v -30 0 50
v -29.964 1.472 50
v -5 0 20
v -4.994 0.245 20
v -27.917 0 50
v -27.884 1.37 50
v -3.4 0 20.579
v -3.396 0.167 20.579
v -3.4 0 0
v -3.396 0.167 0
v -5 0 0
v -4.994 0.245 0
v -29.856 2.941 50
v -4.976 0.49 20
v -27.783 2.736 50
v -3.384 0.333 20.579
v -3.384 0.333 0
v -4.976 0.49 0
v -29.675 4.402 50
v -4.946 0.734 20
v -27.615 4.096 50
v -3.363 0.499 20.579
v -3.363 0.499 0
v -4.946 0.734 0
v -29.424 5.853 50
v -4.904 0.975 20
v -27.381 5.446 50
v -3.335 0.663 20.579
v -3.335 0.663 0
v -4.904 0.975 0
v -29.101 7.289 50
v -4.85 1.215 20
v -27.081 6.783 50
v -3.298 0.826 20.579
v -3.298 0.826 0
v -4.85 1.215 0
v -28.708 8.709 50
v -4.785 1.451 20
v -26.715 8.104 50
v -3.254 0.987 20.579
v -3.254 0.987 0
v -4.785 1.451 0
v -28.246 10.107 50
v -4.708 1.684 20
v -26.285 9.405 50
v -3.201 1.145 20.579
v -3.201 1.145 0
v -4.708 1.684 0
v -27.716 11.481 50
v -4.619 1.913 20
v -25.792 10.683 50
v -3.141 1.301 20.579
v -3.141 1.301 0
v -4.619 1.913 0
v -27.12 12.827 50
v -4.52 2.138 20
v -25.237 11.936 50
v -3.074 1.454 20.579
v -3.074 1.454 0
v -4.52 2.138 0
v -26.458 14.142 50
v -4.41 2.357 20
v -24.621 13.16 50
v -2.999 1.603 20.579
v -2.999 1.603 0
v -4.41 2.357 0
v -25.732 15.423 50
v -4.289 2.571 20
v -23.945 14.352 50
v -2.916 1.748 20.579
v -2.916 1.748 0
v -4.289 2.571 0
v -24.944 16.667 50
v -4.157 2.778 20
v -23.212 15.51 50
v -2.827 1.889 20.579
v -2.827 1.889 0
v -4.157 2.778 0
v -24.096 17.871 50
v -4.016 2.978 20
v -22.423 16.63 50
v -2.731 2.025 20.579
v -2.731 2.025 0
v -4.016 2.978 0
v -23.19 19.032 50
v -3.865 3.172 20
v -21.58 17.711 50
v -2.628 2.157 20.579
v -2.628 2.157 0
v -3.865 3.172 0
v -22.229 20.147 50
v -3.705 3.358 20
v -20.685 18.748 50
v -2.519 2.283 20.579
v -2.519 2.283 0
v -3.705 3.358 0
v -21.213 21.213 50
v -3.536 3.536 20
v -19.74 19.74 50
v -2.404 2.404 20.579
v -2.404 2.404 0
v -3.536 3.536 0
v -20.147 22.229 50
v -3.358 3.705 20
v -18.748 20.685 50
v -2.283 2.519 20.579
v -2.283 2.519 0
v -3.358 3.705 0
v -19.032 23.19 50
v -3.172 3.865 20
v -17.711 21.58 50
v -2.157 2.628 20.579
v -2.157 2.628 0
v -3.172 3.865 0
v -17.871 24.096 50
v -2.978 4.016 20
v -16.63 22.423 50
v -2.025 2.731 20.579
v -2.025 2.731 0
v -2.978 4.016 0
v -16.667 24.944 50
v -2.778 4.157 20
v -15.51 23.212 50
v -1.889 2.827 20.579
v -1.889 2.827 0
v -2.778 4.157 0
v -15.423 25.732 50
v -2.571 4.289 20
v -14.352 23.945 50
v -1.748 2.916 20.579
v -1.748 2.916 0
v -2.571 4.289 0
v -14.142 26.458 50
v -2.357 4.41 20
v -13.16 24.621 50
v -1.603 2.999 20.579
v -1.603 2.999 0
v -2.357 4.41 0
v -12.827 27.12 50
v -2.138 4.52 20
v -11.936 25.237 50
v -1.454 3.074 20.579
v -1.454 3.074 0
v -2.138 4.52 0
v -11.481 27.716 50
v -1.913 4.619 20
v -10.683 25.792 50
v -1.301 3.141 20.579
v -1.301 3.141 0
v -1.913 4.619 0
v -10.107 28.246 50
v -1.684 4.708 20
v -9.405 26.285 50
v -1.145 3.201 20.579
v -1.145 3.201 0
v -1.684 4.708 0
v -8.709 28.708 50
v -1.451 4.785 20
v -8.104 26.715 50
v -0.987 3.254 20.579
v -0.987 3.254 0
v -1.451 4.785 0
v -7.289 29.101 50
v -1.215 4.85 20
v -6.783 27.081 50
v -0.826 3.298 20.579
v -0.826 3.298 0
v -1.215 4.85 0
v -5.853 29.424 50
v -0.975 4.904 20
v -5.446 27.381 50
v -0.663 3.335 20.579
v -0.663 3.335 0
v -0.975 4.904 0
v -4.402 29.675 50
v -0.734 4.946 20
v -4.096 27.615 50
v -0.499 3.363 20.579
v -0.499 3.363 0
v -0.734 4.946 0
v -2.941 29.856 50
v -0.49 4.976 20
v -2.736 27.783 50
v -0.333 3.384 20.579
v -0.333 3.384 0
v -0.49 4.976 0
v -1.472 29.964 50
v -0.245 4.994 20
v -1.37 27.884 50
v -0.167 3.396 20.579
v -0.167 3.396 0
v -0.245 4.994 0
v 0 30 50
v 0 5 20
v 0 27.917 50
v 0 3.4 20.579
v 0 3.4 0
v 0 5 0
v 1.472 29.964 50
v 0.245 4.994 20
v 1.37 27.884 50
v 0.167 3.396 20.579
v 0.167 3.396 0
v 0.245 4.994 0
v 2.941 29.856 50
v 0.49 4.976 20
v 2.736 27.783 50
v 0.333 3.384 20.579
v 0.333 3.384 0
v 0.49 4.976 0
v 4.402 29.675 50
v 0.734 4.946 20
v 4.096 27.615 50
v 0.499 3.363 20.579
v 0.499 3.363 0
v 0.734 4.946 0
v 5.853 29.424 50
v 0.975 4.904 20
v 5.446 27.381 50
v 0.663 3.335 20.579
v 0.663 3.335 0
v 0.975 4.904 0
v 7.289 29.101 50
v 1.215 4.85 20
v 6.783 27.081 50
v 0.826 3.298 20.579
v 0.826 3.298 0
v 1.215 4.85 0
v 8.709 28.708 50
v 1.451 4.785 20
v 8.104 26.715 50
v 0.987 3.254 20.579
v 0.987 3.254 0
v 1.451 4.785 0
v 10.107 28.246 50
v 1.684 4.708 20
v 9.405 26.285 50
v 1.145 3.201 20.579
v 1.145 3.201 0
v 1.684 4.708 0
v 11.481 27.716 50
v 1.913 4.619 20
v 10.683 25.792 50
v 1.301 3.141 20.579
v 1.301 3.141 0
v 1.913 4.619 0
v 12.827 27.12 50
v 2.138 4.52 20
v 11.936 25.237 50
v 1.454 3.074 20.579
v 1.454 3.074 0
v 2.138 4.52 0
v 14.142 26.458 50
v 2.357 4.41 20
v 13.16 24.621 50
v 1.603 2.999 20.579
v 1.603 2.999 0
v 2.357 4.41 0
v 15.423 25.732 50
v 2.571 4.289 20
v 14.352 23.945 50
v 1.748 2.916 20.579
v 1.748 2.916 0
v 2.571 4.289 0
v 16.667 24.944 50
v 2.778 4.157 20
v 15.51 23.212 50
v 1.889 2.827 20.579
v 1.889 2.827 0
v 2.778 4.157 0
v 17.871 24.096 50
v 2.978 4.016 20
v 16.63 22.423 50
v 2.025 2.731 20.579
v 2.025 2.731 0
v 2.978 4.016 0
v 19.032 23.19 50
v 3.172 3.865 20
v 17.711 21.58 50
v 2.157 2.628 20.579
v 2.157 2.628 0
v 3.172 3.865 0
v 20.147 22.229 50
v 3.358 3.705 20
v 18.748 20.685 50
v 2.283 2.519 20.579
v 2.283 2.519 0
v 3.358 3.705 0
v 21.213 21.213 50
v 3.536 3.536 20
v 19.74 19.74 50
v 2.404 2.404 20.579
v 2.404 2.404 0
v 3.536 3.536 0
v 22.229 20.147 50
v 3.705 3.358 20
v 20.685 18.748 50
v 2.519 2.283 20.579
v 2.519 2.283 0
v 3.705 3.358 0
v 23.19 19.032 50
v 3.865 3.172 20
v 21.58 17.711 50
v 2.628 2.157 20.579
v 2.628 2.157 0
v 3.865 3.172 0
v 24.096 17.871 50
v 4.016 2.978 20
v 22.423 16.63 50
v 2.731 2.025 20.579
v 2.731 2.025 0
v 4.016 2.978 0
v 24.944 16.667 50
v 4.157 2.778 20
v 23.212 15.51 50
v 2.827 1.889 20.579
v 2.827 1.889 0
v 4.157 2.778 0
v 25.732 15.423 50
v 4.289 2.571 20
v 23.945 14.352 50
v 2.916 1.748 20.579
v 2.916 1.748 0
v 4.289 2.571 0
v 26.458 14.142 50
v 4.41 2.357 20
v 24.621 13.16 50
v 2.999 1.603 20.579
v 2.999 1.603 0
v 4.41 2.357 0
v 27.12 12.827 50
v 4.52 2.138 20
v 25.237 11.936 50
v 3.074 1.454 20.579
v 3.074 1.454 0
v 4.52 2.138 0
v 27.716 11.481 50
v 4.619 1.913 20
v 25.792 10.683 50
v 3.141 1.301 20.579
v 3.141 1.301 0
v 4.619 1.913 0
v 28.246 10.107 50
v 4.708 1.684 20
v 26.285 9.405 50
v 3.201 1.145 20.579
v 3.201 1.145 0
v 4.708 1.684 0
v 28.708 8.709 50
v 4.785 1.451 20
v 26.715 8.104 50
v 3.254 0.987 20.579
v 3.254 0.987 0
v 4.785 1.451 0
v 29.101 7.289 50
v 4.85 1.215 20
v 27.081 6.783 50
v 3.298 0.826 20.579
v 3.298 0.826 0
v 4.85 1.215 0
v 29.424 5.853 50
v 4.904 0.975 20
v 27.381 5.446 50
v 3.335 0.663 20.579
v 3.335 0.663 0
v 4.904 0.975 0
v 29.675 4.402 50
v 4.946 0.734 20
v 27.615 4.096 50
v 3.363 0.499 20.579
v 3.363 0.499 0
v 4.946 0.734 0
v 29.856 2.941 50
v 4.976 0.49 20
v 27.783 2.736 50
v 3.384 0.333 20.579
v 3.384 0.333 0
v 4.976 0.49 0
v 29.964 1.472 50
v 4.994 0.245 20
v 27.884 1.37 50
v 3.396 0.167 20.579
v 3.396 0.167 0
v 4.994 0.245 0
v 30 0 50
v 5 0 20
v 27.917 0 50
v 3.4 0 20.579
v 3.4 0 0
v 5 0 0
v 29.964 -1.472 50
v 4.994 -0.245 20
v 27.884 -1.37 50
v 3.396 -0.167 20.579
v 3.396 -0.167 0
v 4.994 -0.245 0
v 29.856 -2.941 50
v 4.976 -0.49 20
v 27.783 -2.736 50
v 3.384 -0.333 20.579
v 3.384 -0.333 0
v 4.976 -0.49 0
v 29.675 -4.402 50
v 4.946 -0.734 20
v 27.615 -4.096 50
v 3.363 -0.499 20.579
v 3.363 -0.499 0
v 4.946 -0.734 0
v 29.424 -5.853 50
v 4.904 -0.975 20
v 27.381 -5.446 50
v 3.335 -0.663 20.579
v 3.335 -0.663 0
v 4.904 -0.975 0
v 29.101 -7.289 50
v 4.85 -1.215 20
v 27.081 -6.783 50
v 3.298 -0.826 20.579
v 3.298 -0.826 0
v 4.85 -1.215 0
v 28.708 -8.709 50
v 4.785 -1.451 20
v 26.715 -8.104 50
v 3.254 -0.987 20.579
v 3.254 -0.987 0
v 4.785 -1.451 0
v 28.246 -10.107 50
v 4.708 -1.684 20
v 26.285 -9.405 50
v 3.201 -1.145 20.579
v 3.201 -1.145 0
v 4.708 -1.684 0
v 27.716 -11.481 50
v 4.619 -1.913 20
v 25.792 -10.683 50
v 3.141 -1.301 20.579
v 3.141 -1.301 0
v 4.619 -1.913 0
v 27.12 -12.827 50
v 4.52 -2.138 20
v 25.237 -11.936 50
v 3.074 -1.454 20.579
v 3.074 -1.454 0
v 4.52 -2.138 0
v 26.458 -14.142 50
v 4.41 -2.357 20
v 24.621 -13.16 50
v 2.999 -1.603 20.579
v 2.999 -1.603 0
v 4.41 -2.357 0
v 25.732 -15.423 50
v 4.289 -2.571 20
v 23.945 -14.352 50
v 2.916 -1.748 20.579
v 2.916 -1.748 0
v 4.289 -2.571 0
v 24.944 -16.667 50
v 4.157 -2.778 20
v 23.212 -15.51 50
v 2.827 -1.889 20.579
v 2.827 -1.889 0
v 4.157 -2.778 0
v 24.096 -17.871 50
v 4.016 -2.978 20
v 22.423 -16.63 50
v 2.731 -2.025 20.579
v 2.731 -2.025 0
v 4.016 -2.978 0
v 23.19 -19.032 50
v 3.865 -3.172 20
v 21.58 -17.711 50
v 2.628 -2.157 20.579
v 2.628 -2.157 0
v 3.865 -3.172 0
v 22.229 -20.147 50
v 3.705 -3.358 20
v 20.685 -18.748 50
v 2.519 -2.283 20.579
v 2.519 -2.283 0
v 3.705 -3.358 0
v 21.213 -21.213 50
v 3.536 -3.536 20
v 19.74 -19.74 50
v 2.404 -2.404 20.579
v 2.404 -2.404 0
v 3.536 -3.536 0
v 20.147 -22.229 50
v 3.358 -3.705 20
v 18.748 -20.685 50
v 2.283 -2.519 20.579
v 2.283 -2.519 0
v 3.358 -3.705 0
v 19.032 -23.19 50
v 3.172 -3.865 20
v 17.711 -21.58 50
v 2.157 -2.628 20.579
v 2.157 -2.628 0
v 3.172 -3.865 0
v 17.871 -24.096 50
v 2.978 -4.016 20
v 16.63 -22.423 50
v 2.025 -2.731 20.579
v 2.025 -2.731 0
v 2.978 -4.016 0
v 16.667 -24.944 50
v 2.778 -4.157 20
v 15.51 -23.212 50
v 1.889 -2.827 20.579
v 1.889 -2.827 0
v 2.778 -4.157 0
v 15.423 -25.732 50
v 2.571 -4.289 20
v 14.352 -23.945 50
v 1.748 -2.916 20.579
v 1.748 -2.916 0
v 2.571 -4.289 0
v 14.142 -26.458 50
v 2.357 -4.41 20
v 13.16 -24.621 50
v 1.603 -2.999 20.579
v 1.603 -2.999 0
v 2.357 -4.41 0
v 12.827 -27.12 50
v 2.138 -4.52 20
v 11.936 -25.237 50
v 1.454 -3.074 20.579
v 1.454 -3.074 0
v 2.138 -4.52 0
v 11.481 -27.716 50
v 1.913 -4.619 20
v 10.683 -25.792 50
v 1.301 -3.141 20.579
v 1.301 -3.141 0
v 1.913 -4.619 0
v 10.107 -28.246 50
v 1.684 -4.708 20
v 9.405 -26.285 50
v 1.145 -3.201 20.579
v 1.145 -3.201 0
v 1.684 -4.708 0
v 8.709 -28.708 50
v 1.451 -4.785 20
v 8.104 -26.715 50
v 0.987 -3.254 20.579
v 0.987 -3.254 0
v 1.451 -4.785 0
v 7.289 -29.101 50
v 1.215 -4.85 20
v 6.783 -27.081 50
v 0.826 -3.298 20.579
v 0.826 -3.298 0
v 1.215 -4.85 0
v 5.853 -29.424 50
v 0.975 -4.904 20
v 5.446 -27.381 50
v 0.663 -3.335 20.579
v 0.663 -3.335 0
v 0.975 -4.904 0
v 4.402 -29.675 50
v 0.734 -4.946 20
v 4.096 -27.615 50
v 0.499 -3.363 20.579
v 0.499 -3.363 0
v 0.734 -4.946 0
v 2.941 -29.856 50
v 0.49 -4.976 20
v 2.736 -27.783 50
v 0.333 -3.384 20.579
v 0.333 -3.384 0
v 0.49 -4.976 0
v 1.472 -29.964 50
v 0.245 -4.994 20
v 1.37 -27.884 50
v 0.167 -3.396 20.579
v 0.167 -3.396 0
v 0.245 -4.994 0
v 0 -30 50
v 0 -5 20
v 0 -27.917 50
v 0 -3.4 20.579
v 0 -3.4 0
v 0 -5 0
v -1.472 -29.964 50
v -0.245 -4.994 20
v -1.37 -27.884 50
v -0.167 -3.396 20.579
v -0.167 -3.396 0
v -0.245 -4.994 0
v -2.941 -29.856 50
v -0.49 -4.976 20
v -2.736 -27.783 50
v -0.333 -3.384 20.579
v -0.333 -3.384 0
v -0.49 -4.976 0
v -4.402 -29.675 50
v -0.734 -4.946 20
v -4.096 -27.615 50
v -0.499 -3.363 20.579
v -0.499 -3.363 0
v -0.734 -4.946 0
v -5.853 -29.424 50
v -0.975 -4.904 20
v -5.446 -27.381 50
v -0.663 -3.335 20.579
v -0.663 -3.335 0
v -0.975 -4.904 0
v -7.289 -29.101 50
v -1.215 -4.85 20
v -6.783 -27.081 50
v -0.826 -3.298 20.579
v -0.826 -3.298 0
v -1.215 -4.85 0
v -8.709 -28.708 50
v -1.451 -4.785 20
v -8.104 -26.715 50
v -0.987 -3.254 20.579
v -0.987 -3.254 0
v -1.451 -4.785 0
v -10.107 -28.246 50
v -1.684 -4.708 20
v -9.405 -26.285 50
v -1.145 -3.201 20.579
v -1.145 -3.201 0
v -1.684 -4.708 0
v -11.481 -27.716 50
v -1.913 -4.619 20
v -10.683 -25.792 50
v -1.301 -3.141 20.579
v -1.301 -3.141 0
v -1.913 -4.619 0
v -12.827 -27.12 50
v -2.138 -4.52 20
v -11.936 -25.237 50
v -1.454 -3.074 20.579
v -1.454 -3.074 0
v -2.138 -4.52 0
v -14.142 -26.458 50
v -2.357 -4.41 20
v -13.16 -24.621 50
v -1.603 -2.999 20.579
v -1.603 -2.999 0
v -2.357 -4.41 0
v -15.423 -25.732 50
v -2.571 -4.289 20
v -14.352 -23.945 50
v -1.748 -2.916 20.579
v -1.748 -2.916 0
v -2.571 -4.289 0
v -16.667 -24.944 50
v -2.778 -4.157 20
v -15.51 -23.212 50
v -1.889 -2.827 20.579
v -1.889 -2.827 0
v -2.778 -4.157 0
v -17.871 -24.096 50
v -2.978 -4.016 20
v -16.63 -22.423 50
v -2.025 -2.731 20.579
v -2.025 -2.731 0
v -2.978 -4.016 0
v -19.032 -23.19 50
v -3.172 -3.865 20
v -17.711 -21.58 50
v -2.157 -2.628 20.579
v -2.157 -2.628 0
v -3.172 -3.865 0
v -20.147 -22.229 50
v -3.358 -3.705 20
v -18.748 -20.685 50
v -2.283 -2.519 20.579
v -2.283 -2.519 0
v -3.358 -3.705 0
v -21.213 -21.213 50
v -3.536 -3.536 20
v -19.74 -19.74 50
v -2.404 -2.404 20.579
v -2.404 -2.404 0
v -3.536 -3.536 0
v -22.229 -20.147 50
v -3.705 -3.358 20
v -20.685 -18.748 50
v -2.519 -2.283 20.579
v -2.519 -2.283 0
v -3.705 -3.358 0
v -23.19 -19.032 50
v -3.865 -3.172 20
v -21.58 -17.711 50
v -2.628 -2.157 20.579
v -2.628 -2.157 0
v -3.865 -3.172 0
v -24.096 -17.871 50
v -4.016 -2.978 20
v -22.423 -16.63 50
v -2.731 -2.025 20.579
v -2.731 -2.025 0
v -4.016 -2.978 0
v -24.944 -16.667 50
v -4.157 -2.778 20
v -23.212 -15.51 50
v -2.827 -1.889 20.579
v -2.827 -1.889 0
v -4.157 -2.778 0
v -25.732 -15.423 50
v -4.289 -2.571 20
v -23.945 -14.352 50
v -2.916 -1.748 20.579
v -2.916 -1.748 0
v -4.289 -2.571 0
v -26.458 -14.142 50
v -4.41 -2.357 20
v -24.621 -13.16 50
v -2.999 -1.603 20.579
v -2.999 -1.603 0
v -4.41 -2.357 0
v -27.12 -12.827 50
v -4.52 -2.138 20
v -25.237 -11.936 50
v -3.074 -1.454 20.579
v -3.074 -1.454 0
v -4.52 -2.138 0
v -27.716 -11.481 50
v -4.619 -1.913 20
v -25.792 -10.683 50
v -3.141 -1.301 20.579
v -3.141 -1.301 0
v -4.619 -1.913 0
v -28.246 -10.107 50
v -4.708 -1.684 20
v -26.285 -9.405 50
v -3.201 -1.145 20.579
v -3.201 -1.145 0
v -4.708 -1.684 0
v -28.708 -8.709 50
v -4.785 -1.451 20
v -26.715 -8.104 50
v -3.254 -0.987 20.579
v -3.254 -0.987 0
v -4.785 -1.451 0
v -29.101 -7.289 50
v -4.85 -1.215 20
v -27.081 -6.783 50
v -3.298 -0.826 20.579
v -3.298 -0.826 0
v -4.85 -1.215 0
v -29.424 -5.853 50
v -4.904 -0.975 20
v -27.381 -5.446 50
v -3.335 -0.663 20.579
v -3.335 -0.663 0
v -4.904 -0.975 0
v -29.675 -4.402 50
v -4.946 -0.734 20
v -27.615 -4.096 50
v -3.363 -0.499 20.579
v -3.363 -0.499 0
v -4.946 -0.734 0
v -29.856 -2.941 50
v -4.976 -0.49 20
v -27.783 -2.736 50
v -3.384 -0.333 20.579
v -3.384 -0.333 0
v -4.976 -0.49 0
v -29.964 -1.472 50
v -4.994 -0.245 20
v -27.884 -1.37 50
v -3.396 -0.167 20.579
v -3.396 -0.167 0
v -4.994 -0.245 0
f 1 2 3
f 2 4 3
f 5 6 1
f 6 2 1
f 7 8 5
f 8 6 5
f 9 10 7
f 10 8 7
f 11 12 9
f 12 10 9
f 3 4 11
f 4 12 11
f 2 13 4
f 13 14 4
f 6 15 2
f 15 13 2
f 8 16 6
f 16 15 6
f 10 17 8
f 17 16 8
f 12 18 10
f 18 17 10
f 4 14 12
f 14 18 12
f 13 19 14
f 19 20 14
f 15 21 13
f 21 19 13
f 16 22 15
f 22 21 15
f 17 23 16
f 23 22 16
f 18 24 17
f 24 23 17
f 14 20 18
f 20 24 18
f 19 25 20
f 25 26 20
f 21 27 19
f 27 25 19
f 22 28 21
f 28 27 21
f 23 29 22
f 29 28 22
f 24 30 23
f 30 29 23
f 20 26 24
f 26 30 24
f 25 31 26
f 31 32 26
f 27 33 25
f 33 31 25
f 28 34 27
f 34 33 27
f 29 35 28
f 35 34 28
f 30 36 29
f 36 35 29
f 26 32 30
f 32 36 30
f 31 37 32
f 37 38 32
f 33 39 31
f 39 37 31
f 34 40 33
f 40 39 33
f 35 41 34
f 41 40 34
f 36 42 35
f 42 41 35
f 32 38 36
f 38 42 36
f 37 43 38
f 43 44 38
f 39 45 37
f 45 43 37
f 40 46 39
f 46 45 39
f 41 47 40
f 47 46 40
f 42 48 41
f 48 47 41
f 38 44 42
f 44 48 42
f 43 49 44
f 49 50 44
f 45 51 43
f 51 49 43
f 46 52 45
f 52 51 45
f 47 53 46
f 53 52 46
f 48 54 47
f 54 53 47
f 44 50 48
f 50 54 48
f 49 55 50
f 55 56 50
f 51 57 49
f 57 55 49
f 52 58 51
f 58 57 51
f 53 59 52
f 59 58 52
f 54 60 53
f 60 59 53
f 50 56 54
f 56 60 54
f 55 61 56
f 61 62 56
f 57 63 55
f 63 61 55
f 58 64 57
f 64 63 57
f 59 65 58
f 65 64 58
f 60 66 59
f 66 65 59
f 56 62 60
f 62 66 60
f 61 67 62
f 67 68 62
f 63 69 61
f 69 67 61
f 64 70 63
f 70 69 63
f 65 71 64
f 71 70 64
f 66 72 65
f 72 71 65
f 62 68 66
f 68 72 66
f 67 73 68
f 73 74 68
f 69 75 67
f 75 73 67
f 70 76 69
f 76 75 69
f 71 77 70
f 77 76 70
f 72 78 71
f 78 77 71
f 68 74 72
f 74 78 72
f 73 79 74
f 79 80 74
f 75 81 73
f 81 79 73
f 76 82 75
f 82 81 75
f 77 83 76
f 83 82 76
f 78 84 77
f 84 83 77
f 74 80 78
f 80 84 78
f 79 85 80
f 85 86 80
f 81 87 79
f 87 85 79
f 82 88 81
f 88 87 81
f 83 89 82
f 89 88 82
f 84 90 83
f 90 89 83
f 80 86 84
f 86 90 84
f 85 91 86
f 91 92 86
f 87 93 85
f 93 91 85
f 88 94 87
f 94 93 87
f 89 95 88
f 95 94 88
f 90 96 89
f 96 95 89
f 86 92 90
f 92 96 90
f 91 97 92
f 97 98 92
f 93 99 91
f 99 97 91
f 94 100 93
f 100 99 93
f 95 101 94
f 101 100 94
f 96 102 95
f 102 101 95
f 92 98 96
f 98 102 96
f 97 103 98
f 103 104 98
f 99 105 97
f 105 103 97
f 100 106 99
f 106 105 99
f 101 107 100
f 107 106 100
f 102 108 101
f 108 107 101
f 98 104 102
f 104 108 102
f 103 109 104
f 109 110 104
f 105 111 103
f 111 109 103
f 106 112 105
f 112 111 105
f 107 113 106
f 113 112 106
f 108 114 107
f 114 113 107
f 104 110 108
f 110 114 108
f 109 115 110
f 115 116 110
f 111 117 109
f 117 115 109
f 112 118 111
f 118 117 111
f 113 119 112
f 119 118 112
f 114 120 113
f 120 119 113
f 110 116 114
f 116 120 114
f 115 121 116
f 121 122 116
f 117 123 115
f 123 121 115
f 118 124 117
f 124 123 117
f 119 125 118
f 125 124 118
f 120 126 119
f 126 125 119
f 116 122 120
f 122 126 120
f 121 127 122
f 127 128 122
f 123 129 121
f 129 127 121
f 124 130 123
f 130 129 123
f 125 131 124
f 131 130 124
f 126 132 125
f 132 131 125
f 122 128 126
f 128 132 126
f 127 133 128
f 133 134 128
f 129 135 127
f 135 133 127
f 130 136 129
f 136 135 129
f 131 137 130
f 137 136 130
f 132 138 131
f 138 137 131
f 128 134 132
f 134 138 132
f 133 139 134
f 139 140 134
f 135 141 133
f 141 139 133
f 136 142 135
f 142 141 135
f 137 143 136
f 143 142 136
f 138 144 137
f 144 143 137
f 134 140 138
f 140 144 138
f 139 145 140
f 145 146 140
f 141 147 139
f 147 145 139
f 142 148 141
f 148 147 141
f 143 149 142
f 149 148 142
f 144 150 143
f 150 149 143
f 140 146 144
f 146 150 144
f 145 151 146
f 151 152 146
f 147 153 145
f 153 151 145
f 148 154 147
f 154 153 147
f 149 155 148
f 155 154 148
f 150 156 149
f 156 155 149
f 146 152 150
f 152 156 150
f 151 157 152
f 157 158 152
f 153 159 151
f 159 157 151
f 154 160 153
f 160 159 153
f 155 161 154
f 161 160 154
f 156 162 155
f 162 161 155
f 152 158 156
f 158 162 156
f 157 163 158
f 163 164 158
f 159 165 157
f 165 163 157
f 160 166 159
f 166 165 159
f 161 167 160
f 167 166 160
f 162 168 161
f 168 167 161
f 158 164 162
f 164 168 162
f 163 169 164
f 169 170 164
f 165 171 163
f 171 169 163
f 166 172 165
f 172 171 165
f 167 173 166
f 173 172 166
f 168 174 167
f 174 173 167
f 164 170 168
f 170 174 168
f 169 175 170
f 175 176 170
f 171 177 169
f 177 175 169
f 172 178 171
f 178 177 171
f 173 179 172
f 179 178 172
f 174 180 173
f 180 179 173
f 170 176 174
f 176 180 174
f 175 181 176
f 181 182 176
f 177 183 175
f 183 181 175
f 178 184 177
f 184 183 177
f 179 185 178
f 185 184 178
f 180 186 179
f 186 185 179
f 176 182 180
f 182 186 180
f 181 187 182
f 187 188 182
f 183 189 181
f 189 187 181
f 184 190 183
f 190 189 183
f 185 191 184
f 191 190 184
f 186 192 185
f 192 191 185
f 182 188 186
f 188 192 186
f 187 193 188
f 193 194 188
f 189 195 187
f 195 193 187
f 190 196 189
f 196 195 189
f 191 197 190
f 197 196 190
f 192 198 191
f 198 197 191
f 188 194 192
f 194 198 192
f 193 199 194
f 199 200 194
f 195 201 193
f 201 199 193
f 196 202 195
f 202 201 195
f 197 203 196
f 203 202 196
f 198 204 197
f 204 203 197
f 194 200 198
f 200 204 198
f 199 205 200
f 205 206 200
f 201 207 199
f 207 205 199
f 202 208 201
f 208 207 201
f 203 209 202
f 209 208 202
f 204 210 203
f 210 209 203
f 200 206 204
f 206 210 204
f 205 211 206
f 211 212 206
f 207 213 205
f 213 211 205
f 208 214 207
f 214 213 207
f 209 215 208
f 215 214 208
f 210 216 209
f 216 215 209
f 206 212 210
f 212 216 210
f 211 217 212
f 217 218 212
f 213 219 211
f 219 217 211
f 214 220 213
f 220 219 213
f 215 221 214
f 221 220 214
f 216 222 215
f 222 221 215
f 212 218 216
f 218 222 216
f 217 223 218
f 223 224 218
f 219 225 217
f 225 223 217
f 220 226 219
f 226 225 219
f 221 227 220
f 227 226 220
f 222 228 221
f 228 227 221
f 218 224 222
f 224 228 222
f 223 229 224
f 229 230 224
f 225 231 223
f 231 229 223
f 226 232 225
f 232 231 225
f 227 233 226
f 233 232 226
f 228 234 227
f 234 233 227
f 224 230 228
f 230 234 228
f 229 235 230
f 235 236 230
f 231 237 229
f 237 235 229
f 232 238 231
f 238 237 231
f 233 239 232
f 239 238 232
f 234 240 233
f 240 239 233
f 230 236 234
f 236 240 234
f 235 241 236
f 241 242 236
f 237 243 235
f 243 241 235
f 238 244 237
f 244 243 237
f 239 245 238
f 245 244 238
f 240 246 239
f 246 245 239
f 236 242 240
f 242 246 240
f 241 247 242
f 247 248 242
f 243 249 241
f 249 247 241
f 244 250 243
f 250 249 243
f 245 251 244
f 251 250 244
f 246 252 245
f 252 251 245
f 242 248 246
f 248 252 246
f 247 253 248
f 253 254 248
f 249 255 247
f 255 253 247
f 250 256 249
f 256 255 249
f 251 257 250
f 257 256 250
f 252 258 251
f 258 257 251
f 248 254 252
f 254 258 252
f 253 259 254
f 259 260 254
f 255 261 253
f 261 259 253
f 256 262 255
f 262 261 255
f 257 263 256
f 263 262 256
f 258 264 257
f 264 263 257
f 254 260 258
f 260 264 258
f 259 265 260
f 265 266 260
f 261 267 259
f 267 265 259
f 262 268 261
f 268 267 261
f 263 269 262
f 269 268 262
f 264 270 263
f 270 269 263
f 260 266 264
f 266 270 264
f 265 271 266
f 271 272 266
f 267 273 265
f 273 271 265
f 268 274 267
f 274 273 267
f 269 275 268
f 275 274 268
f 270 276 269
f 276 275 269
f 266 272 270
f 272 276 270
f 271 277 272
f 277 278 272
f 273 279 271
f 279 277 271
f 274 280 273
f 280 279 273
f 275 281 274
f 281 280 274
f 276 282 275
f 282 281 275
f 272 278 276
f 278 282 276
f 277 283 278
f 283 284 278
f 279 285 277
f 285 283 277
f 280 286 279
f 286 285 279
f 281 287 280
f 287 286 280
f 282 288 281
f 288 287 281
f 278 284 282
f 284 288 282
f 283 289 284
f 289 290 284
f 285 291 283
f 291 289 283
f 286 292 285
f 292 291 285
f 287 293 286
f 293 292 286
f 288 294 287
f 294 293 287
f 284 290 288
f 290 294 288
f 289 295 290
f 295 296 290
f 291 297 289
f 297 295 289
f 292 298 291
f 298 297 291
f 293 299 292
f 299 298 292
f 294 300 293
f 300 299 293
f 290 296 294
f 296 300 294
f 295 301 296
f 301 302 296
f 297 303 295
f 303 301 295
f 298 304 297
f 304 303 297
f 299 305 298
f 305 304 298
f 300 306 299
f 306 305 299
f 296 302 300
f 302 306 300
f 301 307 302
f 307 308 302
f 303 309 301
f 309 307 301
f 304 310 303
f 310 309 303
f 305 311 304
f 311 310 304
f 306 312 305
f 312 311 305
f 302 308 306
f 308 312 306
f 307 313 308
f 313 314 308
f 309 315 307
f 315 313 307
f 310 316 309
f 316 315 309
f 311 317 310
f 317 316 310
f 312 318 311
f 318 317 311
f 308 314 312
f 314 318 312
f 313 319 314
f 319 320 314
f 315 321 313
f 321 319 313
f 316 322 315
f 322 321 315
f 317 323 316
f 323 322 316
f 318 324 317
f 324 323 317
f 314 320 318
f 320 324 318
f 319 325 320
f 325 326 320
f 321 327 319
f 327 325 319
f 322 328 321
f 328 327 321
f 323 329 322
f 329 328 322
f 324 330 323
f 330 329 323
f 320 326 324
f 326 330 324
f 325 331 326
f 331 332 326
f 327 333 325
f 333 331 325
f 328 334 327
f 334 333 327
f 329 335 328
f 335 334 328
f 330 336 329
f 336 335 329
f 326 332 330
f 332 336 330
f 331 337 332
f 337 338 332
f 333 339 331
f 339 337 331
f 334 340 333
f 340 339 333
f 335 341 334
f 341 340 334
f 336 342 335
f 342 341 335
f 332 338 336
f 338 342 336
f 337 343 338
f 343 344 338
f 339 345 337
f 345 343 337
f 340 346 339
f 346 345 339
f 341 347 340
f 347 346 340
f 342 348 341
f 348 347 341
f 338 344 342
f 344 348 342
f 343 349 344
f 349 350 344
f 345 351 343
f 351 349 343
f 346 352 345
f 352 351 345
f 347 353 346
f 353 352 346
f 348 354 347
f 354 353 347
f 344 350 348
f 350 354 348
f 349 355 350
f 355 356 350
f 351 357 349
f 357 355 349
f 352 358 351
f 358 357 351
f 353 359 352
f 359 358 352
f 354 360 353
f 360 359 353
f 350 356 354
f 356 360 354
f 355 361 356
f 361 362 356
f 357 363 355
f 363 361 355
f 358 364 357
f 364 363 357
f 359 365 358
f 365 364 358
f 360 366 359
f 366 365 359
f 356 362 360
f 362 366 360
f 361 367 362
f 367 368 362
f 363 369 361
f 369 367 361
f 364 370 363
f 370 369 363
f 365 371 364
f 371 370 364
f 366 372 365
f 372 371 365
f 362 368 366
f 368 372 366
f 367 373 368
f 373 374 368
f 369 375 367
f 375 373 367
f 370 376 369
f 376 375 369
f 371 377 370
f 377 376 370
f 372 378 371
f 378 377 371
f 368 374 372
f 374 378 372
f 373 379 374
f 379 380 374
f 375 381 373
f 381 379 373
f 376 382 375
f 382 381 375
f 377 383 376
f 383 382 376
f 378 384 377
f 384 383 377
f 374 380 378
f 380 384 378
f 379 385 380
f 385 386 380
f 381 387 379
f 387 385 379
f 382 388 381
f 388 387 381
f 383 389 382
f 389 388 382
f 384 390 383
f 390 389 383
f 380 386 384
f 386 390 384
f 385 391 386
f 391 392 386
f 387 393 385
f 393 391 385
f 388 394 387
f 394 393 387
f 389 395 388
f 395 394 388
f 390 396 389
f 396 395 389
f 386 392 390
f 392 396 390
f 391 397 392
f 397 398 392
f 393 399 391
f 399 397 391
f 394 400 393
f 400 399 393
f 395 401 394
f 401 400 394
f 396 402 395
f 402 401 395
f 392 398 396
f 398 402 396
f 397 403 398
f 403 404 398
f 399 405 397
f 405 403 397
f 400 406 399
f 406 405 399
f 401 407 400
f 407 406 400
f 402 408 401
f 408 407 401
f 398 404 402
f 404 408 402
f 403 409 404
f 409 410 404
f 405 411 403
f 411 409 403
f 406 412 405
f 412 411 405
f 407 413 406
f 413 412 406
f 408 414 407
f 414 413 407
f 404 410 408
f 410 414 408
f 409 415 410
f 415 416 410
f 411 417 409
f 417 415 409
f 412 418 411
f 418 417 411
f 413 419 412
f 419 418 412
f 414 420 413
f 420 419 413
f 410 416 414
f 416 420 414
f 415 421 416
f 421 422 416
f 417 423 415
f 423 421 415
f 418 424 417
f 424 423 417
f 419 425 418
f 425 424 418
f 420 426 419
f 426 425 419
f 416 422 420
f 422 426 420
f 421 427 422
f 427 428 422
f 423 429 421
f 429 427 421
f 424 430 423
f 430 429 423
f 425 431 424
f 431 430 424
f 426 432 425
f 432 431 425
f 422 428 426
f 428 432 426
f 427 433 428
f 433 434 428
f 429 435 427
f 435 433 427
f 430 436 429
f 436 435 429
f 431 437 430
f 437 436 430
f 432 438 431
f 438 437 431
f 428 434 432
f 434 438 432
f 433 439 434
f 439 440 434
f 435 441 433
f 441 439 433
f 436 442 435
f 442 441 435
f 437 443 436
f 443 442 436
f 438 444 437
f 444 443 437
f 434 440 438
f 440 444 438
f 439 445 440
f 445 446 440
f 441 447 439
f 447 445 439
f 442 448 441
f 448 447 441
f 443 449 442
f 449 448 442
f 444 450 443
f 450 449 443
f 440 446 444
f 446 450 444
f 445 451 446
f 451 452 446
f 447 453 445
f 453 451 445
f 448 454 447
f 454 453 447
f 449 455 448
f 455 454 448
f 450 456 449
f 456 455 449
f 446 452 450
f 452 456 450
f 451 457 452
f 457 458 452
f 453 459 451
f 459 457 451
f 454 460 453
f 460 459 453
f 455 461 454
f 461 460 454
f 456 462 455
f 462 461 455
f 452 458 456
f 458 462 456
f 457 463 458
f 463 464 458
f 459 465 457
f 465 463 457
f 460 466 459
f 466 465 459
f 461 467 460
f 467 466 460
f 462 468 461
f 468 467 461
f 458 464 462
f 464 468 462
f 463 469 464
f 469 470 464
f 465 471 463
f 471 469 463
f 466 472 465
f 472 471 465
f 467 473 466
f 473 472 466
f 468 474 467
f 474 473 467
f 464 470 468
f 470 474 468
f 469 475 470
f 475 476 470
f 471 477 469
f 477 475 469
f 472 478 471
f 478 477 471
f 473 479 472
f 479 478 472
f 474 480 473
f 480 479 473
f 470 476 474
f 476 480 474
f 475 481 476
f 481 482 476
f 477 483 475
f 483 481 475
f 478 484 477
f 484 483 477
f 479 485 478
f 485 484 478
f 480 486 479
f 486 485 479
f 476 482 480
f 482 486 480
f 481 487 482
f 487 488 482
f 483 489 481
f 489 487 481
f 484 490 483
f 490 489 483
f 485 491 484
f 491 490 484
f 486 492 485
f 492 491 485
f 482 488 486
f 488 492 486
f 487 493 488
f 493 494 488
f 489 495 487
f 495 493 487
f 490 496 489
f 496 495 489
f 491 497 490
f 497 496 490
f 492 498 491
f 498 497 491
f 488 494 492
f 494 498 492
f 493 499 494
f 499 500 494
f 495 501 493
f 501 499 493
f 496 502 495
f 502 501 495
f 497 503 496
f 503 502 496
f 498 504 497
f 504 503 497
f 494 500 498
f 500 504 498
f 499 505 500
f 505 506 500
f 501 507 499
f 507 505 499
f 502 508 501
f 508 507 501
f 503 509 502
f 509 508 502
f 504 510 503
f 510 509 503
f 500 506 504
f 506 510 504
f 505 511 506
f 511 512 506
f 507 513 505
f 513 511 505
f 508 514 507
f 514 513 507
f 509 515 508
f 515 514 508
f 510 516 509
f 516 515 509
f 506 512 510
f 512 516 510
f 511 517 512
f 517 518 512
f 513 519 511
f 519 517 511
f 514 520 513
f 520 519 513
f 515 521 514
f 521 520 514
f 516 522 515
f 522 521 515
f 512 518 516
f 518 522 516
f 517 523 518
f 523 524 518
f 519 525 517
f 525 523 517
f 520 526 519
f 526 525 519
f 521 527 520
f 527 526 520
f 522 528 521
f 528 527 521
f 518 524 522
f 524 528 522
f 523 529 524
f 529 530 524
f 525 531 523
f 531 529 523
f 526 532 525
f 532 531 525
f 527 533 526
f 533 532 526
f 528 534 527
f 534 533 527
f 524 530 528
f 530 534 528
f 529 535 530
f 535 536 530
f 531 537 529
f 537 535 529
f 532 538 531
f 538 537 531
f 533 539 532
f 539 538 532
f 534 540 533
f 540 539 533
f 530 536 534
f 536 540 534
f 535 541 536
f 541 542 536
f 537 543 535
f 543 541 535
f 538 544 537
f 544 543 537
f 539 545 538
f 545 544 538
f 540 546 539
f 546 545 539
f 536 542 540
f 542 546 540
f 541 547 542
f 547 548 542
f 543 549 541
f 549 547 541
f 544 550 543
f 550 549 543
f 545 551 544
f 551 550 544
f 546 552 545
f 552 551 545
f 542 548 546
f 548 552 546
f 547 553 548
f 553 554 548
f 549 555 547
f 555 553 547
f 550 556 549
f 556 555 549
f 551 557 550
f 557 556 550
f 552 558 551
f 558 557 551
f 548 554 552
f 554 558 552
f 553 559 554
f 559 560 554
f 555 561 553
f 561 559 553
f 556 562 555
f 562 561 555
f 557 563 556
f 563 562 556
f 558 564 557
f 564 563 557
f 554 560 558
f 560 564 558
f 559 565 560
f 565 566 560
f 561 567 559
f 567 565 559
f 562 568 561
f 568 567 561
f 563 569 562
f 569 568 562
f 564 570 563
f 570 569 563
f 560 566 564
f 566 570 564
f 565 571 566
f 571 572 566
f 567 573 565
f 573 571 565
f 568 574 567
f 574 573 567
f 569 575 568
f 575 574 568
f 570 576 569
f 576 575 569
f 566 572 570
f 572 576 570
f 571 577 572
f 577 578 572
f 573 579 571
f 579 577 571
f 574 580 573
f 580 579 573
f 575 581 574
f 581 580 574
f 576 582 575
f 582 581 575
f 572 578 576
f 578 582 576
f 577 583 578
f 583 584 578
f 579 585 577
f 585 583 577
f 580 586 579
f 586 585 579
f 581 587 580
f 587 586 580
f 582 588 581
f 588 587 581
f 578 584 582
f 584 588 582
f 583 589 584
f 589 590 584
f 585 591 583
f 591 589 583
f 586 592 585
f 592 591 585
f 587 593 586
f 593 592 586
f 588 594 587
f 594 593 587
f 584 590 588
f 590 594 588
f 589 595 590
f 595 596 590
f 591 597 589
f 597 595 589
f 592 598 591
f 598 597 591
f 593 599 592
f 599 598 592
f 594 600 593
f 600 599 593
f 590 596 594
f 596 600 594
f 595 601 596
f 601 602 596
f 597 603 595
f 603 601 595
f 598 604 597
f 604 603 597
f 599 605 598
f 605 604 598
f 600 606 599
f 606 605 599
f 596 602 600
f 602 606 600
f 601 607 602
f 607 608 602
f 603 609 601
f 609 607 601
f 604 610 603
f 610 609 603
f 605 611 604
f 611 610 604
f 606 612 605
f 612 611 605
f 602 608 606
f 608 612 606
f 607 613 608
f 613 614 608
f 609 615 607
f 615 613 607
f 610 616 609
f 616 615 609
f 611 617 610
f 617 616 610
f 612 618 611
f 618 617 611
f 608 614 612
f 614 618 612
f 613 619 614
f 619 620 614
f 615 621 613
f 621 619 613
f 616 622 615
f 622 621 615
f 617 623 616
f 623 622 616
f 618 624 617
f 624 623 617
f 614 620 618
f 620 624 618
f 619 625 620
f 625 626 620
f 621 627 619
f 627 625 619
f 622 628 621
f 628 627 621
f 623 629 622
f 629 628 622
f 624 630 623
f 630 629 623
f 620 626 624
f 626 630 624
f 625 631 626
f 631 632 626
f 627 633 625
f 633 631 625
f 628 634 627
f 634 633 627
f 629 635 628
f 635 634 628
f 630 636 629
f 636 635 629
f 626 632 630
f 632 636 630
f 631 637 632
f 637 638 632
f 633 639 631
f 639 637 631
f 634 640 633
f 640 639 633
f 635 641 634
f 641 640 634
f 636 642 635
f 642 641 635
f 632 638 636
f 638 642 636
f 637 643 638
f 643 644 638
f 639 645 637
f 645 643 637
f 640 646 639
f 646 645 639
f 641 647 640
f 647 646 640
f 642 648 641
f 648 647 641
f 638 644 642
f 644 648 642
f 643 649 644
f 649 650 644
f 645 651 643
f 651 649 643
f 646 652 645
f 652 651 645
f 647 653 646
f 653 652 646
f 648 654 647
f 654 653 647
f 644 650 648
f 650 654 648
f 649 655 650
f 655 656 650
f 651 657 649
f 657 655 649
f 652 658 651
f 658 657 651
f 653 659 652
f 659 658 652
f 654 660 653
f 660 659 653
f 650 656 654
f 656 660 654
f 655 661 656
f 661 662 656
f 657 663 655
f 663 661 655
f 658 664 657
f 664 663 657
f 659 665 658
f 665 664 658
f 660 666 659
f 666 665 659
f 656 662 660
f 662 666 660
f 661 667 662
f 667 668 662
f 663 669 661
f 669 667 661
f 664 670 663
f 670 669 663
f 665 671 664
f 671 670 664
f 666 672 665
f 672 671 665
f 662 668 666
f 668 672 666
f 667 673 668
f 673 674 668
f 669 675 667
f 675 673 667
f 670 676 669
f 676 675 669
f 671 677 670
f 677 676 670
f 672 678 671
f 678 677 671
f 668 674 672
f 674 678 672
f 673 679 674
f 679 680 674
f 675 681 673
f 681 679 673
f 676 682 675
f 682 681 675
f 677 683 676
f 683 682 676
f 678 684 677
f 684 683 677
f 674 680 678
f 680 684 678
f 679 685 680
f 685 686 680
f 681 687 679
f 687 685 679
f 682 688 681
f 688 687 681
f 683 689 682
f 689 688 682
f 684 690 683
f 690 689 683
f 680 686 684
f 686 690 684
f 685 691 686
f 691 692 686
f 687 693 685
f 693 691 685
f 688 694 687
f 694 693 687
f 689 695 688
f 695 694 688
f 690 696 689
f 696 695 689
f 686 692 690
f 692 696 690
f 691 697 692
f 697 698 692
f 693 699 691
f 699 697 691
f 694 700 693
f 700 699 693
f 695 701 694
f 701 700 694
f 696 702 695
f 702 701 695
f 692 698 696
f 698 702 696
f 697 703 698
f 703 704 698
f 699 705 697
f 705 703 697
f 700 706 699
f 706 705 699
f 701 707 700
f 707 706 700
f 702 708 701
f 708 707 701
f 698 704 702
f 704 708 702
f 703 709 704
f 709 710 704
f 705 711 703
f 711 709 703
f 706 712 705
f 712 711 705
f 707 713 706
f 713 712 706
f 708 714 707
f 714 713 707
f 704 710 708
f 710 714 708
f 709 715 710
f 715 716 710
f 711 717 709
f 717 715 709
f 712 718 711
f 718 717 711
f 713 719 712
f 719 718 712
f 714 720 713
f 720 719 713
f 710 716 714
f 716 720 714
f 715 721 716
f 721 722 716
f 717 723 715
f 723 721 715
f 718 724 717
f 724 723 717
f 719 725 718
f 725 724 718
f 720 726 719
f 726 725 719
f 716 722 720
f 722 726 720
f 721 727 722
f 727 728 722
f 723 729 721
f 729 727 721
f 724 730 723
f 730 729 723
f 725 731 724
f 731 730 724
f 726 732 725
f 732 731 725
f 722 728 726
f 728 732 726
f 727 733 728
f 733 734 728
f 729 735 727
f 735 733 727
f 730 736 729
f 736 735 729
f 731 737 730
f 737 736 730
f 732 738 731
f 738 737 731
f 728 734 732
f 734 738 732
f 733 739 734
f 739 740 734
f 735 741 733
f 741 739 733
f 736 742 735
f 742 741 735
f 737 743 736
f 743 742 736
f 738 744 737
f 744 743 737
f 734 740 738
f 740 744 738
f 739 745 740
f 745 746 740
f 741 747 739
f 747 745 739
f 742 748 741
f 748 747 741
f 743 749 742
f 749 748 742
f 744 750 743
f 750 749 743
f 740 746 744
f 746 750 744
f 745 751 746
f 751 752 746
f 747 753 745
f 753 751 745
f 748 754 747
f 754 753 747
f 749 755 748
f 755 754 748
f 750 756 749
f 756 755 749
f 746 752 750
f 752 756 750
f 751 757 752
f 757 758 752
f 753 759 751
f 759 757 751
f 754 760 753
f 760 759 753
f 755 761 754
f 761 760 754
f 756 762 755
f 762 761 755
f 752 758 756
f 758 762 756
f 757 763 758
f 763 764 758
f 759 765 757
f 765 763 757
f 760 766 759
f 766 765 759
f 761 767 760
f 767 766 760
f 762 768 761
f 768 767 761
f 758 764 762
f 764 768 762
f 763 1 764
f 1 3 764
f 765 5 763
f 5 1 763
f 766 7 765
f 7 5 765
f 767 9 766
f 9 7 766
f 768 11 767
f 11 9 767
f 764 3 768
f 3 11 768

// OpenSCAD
// Small lab funnel - printed upright, wide opening at top
// Built as a single rotate_extrude of the wall cross-section,
// so the funnel is open at both ends.

$fn = 128;                 // smoothness of round surfaces

// ---------------- Dimensions (mm) ----------------
spout_od      = 10;        // spout outer diameter
spout_h       = 20;        // spout height (z = 0 .. 20)
rim_od        = 60;        // cone outer diameter at rim
total_h       = 50;        // rim height (top of funnel)
wall          = 1.6;       // wall thickness (normal to surface)

// ---------------- Derived values ----------------
spout_r       = spout_od / 2;                 // 5.0  outer spout radius
bore_r        = spout_r - wall;               // 3.4  spout bore radius (6.8 mm bore)
rim_r         = rim_od / 2;                   // 30.0 outer rim radius
cone_h        = total_h - spout_h;            // 30.0 cone height
cone_k        = (rim_r - spout_r) / cone_h;   // radial growth per mm of height
// Horizontal offset that gives a true 1.6 mm wall perpendicular to the cone side
cone_off      = wall * sqrt(1 + cone_k * cone_k);
// Height where the inner cone surface meets the spout bore
join_z        = spout_h + (cone_off - wall) / cone_k;
rim_inner_r   = rim_r - cone_off;             // inner radius at rim

// ---------------- Model ----------------
rotate_extrude(convexity = 4)
    polygon(points = [
        [bore_r,      0],        // bottom inner edge of spout
        [spout_r,     0],        // bottom outer edge of spout
        [spout_r,     spout_h],  // top of straight spout (outer)
        [rim_r,       total_h],  // outer rim
        [rim_inner_r, total_h],  // inner rim
        [bore_r,      join_z]    // inner cone meets spout bore
    ]);
